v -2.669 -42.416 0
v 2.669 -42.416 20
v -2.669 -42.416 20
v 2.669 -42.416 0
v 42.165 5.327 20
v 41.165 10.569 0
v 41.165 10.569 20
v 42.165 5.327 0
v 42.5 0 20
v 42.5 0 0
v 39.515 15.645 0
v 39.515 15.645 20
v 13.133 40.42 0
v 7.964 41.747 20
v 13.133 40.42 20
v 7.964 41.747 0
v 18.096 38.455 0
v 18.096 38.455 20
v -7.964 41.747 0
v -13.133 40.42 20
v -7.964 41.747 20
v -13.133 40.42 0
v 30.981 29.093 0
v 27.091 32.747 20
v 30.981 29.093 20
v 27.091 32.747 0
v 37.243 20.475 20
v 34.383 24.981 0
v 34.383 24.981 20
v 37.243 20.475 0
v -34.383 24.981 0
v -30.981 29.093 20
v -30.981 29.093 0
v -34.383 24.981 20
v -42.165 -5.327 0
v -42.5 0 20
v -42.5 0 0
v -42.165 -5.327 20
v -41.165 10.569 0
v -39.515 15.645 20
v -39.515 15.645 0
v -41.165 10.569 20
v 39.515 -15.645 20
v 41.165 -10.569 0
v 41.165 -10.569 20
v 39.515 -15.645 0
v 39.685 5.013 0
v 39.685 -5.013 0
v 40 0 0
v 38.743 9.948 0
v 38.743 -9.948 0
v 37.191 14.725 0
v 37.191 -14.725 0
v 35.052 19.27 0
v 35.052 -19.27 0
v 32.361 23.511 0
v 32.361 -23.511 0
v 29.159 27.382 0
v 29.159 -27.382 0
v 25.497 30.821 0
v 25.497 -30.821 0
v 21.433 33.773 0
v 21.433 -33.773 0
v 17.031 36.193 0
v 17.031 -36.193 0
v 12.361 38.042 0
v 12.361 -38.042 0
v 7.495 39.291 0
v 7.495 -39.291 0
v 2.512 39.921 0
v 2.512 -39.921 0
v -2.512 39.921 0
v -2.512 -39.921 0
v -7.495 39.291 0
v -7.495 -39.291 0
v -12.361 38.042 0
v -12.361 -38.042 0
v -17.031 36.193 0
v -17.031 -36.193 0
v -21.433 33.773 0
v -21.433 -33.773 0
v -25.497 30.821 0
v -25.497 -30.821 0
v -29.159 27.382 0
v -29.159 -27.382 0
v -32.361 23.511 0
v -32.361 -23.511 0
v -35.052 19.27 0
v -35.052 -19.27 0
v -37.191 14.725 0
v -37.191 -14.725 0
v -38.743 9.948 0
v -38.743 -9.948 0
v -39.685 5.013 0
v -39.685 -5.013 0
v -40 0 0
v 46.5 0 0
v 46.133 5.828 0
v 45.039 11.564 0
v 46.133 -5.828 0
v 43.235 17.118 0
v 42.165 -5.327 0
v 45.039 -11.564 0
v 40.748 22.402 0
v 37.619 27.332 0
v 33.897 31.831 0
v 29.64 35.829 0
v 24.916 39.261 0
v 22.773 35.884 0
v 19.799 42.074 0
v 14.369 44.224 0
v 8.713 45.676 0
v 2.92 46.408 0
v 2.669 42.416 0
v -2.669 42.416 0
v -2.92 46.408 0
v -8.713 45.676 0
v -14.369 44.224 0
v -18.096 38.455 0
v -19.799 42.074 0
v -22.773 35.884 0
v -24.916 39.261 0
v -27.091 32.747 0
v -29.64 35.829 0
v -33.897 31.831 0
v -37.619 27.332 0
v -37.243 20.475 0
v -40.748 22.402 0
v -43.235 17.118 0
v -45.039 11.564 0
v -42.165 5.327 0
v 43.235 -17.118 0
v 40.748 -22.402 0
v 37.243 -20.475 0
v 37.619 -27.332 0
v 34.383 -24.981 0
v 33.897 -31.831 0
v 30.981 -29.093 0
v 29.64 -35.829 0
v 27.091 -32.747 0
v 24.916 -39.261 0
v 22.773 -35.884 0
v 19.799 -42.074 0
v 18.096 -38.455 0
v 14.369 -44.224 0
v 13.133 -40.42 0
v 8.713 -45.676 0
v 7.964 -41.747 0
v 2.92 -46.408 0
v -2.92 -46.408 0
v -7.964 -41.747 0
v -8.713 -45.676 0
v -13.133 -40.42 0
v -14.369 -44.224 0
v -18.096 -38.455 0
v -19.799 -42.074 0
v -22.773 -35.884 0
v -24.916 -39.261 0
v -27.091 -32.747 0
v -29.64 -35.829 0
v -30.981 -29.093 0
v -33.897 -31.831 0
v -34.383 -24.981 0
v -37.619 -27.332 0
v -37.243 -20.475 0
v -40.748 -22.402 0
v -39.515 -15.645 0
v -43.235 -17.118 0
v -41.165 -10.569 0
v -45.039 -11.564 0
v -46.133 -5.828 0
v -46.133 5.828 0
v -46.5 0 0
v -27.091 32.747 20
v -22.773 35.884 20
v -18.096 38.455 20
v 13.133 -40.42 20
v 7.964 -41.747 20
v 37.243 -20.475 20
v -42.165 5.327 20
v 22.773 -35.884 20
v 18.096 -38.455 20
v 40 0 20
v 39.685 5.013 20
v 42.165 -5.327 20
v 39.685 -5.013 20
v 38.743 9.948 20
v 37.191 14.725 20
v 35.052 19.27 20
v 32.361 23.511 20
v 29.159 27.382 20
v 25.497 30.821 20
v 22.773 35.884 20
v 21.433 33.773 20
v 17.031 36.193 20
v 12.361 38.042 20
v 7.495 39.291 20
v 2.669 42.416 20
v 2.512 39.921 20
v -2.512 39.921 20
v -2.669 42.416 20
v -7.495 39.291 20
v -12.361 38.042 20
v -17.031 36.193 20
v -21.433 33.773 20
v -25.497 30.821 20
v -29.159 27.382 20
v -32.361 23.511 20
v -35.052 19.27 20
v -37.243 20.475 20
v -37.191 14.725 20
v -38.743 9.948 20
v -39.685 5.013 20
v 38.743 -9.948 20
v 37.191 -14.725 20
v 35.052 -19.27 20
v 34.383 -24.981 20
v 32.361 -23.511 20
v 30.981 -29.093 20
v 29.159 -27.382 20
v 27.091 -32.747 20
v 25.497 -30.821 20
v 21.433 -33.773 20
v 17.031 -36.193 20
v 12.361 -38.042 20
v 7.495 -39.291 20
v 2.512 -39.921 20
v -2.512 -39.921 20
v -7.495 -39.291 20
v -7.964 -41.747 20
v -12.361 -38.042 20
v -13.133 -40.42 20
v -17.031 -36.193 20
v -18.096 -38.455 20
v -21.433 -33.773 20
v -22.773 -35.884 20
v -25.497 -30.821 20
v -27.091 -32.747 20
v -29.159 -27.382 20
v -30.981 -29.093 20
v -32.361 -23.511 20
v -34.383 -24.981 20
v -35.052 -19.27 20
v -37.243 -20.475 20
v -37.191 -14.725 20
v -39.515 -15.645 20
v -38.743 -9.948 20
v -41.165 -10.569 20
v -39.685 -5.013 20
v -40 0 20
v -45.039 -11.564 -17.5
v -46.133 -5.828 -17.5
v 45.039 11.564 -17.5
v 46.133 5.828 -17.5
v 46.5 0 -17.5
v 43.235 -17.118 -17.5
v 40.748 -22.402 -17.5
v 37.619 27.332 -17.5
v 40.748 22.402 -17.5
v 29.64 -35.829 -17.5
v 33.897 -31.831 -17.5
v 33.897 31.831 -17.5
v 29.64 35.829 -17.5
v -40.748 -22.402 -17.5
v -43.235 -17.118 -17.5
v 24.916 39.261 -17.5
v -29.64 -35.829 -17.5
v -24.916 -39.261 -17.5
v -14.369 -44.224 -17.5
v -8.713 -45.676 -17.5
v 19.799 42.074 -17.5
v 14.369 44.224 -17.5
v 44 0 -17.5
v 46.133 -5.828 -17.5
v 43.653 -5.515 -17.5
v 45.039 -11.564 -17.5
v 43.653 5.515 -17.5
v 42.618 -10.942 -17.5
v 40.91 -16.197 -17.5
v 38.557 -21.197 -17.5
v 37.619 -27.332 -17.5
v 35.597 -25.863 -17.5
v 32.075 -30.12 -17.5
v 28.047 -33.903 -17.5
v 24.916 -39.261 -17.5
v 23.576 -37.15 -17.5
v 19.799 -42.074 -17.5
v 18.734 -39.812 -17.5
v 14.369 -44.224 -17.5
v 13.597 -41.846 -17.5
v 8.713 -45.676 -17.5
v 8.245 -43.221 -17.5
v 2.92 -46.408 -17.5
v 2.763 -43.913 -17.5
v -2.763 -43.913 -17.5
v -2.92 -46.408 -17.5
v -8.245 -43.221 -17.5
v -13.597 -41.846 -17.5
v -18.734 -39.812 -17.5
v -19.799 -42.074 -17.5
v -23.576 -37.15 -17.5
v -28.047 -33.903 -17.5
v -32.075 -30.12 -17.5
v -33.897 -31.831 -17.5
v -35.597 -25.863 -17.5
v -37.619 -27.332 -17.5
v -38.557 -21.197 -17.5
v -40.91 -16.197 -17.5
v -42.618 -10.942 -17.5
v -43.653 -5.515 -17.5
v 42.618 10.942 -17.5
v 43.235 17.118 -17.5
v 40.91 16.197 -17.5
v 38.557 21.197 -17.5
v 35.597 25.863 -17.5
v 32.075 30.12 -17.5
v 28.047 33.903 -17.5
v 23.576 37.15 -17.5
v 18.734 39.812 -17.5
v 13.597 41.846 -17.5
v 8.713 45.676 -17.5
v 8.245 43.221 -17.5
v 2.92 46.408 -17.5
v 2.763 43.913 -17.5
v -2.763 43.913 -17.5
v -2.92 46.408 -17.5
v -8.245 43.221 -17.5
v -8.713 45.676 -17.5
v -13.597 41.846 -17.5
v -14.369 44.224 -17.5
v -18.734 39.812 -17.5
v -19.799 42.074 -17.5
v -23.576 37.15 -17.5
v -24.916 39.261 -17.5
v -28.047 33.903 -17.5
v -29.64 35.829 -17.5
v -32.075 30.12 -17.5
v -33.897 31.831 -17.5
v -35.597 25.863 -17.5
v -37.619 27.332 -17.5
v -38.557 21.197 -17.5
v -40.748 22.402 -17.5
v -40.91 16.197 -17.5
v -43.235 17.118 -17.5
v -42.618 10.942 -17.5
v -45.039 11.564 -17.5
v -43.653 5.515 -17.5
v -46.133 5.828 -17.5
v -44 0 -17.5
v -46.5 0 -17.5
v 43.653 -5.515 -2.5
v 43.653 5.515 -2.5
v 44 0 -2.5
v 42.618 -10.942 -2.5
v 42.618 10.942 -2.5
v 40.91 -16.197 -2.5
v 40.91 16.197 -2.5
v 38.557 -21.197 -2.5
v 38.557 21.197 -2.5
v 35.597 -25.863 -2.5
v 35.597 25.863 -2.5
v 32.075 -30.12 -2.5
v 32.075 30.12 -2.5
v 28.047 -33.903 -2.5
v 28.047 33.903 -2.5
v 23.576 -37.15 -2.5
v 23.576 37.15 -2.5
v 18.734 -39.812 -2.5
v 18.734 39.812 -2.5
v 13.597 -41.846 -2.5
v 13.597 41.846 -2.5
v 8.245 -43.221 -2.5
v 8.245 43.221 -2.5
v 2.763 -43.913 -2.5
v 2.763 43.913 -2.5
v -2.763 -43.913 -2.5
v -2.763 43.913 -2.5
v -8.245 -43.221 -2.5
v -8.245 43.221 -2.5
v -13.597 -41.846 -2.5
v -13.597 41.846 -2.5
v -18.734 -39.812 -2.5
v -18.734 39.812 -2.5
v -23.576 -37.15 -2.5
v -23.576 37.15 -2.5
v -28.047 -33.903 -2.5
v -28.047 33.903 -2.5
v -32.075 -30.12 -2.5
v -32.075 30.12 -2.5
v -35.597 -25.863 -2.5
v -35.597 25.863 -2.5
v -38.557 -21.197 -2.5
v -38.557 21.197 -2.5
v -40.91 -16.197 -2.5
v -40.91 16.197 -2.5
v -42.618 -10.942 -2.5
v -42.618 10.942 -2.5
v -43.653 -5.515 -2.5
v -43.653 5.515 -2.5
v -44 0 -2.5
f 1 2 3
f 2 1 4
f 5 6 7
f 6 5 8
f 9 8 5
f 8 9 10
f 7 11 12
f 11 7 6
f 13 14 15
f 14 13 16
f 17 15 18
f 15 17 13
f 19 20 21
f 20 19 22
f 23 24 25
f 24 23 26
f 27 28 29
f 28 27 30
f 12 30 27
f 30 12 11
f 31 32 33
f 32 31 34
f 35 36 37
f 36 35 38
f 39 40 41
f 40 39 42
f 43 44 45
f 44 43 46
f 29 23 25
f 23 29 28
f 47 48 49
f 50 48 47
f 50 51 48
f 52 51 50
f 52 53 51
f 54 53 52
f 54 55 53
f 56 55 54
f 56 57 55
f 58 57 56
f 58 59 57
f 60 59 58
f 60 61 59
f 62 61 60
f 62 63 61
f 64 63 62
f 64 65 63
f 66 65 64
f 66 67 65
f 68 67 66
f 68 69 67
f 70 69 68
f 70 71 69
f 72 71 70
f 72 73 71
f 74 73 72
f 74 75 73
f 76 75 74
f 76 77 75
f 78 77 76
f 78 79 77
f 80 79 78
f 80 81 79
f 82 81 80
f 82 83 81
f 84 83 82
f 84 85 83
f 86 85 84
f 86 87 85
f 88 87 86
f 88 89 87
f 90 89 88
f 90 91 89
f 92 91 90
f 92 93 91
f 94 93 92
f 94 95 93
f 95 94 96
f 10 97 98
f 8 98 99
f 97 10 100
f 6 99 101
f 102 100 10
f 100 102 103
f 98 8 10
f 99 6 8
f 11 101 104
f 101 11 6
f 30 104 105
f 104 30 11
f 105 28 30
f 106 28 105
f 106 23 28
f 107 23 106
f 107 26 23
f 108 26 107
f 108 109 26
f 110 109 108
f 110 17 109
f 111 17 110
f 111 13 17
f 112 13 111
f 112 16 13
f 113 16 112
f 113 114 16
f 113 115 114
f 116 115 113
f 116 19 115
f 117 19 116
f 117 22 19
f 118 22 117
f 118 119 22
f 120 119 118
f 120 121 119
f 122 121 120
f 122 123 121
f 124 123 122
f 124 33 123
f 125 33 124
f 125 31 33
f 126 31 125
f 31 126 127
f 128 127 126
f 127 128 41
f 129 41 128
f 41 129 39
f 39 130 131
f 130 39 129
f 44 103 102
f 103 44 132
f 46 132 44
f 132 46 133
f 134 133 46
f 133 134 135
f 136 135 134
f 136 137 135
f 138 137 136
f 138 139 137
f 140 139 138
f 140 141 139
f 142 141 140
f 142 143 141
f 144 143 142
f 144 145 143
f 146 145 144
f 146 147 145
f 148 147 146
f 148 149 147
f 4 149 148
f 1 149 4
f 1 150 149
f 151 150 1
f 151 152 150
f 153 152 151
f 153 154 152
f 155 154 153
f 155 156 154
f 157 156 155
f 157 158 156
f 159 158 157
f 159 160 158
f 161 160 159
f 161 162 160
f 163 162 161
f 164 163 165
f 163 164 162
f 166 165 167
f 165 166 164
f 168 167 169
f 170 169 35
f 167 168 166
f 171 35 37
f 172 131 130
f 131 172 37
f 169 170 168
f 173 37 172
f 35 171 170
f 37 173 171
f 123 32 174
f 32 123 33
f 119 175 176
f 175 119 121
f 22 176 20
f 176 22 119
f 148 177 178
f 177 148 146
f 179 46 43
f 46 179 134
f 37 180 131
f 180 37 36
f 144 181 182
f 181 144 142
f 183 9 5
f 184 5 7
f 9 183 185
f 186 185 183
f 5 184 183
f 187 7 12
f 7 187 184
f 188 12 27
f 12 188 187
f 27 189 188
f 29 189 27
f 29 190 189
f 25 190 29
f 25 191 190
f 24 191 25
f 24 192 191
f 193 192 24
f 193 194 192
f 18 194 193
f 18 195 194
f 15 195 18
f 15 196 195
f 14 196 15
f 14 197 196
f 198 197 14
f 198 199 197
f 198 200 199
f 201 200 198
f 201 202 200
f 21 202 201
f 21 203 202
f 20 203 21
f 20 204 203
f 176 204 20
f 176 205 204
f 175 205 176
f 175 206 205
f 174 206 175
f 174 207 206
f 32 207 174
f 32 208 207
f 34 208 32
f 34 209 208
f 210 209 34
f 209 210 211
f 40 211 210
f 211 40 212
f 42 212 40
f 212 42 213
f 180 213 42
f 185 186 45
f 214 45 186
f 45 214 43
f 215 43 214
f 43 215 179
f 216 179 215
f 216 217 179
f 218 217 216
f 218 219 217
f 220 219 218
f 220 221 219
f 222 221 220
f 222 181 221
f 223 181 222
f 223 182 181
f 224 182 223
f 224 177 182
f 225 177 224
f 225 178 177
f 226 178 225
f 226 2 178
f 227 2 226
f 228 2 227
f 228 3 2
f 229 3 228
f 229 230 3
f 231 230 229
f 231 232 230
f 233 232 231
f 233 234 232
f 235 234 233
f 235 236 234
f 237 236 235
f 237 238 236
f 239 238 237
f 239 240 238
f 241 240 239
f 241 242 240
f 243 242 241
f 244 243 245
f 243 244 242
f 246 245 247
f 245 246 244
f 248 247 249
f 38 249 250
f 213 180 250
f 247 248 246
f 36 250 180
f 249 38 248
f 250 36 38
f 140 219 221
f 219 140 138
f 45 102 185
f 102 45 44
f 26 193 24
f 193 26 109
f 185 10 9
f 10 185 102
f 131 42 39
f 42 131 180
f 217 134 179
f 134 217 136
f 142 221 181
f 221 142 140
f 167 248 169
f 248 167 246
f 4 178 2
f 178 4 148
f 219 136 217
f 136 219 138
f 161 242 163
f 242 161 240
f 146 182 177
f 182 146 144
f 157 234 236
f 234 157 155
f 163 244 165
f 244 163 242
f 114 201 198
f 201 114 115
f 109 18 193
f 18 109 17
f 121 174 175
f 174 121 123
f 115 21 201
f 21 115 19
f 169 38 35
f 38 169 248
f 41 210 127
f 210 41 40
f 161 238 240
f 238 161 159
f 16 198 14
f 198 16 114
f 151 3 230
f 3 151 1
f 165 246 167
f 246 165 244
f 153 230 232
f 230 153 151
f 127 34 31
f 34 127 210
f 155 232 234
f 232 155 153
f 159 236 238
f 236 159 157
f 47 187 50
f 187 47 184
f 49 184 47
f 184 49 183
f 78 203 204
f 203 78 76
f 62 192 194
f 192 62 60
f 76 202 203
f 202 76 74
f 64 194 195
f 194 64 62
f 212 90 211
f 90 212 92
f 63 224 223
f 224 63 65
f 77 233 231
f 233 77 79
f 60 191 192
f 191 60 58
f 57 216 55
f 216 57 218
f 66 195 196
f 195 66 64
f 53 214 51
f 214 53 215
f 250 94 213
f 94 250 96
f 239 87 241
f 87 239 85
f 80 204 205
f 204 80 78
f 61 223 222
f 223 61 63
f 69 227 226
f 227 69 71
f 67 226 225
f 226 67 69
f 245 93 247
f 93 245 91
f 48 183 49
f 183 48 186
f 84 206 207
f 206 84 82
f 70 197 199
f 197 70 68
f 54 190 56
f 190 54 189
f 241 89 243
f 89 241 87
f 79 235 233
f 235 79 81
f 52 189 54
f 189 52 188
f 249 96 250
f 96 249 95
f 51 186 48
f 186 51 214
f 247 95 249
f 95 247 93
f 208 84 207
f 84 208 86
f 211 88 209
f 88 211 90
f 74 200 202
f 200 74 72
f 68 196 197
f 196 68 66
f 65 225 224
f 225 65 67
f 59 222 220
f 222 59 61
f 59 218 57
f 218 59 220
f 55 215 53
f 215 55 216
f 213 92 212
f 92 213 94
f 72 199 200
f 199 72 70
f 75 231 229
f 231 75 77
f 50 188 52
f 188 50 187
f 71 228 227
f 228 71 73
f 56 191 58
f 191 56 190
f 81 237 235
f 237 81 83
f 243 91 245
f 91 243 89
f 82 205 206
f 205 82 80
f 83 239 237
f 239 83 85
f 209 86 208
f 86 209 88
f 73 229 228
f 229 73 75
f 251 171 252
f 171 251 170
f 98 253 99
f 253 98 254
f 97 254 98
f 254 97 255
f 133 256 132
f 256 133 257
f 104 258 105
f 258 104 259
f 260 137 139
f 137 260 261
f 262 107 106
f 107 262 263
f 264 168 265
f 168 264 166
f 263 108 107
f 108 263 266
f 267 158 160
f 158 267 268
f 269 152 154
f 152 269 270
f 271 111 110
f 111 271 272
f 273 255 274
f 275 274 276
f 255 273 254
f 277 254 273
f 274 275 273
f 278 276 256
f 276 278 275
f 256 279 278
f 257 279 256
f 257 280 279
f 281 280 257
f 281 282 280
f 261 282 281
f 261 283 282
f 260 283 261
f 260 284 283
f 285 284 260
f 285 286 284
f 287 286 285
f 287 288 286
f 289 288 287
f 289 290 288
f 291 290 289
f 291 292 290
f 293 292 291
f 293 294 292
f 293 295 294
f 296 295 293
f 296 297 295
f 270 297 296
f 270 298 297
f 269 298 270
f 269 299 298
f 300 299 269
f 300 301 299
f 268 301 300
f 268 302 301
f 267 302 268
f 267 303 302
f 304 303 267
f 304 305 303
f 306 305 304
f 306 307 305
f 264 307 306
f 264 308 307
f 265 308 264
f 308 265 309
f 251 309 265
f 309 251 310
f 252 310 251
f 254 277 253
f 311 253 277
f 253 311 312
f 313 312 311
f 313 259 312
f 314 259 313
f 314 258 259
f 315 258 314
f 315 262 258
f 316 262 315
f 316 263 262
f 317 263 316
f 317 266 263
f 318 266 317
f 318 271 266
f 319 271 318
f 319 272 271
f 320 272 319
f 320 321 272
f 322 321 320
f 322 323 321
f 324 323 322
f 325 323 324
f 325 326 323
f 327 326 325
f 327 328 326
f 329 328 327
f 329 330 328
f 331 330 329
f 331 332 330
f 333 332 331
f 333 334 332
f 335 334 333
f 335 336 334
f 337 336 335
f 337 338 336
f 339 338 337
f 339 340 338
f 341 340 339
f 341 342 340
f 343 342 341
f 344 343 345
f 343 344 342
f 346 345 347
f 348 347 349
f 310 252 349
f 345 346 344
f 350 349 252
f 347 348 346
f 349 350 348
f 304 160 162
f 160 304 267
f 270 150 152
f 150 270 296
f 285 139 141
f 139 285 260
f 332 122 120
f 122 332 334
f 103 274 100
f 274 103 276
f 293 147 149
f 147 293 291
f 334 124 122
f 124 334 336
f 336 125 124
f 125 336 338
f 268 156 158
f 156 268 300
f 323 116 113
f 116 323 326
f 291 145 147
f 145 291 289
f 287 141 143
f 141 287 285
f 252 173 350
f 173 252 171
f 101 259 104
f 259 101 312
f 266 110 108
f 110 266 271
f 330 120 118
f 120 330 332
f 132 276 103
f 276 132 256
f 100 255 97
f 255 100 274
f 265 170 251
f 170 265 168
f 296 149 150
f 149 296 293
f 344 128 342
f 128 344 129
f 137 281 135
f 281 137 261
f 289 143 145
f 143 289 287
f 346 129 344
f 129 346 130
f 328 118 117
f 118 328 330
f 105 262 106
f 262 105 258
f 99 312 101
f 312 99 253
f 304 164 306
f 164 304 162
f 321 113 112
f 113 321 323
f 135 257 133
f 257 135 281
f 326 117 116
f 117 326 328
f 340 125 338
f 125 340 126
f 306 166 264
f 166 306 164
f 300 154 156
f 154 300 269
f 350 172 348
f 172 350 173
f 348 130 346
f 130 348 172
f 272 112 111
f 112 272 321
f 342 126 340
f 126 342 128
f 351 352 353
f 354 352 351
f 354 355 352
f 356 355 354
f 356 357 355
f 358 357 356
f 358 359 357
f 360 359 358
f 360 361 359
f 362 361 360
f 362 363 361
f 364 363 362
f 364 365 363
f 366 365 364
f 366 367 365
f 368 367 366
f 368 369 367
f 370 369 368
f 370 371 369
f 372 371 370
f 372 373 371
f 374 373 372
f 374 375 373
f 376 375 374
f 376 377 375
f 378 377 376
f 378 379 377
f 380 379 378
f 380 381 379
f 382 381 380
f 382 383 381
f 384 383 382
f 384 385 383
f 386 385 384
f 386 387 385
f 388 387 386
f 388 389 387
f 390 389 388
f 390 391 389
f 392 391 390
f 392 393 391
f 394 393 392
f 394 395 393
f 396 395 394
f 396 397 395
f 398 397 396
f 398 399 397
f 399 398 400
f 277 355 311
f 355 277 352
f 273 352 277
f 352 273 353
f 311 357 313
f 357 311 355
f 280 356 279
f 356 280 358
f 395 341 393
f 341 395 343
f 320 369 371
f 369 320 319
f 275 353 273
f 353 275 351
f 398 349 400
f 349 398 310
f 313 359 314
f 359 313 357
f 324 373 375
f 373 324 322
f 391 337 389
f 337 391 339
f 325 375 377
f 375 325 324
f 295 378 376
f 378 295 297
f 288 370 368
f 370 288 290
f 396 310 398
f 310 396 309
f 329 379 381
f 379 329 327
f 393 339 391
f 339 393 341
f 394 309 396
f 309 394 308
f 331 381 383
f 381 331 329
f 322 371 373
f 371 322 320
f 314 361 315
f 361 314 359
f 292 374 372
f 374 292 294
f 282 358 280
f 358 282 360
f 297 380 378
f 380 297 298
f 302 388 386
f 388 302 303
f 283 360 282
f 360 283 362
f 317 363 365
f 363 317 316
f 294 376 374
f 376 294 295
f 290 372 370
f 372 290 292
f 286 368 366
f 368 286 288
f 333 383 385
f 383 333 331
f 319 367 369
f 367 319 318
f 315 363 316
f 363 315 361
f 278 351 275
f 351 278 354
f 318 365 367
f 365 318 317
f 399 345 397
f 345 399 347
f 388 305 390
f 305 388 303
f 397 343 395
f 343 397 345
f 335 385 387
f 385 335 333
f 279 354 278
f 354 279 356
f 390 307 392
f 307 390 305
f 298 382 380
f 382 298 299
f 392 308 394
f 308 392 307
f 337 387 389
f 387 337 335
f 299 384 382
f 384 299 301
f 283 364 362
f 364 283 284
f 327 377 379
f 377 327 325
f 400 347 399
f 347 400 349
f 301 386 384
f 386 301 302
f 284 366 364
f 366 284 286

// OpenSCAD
// Inside diameter for the cup
cup_diameter = 80;
// Height of the cup covered by holder
cup_depth = 20;
// Thickness of the printed walls
wall_thickness = 2.5;
// Diameter of the post
post_diameter = 88;
// Height of the post covered by holder
post_height = 15;

$fn=50;

module open_cup(inner_diameter, height, thickness)
{
	difference()
	{
		cylinder(h = height, r = inner_diameter / 2 + wall_thickness);
		translate(v=[0, 0, -.01])
			cylinder(h = height + .02, r = inner_diameter / 2);
	}
}

module cup(cup_diameter, cup_height, post_diameter, post_height, wall_thickness)
{
	open_cup(cup_diameter, cup_height);
	translate(v=[0, 0, -post_height - wall_thickness])
		open_cup(post_diameter, post_height, wall_thickness);

	plate_diameter = max(cup_diameter, post_diameter) + 2 * wall_thickness;
	translate(v = [0, 0, -wall_thickness])
		cylinder(h = wall_thickness, r = plate_diameter / 2);
}

cup(cup_diameter, cup_depth, post_diameter, post_height, wall_thickness);
